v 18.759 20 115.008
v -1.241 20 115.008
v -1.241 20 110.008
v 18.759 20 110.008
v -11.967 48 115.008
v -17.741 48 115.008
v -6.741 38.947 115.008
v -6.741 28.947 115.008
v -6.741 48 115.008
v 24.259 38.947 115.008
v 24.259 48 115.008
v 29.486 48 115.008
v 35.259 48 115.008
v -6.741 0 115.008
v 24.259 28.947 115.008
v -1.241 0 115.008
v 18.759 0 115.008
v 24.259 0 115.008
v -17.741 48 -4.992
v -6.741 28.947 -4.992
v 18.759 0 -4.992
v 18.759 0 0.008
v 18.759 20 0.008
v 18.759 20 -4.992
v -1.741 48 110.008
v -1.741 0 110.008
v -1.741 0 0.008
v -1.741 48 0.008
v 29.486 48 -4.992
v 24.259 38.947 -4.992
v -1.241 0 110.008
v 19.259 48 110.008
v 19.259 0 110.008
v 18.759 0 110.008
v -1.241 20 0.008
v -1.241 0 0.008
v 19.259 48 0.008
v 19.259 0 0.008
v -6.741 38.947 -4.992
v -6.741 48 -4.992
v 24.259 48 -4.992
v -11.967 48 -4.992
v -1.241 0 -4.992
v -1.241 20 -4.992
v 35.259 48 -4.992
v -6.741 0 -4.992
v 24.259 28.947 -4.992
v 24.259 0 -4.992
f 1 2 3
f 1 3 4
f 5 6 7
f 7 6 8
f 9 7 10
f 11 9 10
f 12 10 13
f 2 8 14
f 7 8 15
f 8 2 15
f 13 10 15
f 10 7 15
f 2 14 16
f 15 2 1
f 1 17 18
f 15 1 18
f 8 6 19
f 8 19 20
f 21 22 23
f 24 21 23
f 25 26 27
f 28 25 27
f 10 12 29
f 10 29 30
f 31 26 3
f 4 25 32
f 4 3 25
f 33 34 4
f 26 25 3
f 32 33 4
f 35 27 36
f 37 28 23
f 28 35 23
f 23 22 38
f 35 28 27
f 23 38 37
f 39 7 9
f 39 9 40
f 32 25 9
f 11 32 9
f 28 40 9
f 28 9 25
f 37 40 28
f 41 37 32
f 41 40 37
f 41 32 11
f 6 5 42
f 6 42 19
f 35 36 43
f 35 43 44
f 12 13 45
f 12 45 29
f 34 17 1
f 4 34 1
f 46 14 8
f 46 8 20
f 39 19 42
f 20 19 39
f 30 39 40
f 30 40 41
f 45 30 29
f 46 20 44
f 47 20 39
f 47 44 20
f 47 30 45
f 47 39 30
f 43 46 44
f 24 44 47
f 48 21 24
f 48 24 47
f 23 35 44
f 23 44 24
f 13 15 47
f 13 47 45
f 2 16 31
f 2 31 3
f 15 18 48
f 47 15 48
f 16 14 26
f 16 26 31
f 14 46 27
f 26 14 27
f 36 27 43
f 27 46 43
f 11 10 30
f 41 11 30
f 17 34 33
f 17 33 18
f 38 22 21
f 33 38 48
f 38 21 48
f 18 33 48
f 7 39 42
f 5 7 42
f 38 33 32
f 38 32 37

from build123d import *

# Parameters (mm, degrees)
SKETCH1_W           = 31
SKETCH1_H           = 120
SKETCH1_W_2         = 21
SKETCH1_H_2         = 110
BOSS_EXTRUDE4_DEPTH = 48
SKETCH6_W           = 20
SKETCH6_H           = 20
CUT_EXTRUDE3_DEPTH  = 136
BOSS_EXTRUDE5_DEPTH = 120


with BuildPart() as part:
    # Sketch1 → Boss-Extrude4 (new body)
    with BuildSketch(Plane(origin=(0, 0, 0), x_dir=(1, 0, 0), z_dir=(0, 1, 0))):
        with Locations((8.759280296, -55.007974482)):
            Rectangle(SKETCH1_W, SKETCH1_H)
        with Locations((8.759280296, -55.007974482)):
            Rectangle(SKETCH1_W_2, SKETCH1_H_2, mode=Mode.SUBTRACT)
    extrude(amount=BOSS_EXTRUDE4_DEPTH)

    # Sketch6 → Cut-Extrude3 (cut)
    with BuildSketch(Plane.XY.offset(115.007974482)):
        with Locations((8.759280296, 10)):
            Rectangle(SKETCH6_W, SKETCH6_H)
    extrude(amount=-CUT_EXTRUDE3_DEPTH, mode=Mode.SUBTRACT)

    # Sketch7 → Boss-Extrude5 (add)
    with BuildSketch(Plane.XY.offset(115.007974482)):
        Polygon((-6.740719704, 38.947441117), (-11.967217013, 48), (-17.740719704, 48), (-6.740719704, 28.947441117), align=None)
        Polygon((24.259280296, 38.947441117), (24.259280296, 28.947441117), (35.259280296, 48), (29.485777604, 48), align=None)
    extrude(amount=-BOSS_EXTRUDE5_DEPTH)


solid = part.part
